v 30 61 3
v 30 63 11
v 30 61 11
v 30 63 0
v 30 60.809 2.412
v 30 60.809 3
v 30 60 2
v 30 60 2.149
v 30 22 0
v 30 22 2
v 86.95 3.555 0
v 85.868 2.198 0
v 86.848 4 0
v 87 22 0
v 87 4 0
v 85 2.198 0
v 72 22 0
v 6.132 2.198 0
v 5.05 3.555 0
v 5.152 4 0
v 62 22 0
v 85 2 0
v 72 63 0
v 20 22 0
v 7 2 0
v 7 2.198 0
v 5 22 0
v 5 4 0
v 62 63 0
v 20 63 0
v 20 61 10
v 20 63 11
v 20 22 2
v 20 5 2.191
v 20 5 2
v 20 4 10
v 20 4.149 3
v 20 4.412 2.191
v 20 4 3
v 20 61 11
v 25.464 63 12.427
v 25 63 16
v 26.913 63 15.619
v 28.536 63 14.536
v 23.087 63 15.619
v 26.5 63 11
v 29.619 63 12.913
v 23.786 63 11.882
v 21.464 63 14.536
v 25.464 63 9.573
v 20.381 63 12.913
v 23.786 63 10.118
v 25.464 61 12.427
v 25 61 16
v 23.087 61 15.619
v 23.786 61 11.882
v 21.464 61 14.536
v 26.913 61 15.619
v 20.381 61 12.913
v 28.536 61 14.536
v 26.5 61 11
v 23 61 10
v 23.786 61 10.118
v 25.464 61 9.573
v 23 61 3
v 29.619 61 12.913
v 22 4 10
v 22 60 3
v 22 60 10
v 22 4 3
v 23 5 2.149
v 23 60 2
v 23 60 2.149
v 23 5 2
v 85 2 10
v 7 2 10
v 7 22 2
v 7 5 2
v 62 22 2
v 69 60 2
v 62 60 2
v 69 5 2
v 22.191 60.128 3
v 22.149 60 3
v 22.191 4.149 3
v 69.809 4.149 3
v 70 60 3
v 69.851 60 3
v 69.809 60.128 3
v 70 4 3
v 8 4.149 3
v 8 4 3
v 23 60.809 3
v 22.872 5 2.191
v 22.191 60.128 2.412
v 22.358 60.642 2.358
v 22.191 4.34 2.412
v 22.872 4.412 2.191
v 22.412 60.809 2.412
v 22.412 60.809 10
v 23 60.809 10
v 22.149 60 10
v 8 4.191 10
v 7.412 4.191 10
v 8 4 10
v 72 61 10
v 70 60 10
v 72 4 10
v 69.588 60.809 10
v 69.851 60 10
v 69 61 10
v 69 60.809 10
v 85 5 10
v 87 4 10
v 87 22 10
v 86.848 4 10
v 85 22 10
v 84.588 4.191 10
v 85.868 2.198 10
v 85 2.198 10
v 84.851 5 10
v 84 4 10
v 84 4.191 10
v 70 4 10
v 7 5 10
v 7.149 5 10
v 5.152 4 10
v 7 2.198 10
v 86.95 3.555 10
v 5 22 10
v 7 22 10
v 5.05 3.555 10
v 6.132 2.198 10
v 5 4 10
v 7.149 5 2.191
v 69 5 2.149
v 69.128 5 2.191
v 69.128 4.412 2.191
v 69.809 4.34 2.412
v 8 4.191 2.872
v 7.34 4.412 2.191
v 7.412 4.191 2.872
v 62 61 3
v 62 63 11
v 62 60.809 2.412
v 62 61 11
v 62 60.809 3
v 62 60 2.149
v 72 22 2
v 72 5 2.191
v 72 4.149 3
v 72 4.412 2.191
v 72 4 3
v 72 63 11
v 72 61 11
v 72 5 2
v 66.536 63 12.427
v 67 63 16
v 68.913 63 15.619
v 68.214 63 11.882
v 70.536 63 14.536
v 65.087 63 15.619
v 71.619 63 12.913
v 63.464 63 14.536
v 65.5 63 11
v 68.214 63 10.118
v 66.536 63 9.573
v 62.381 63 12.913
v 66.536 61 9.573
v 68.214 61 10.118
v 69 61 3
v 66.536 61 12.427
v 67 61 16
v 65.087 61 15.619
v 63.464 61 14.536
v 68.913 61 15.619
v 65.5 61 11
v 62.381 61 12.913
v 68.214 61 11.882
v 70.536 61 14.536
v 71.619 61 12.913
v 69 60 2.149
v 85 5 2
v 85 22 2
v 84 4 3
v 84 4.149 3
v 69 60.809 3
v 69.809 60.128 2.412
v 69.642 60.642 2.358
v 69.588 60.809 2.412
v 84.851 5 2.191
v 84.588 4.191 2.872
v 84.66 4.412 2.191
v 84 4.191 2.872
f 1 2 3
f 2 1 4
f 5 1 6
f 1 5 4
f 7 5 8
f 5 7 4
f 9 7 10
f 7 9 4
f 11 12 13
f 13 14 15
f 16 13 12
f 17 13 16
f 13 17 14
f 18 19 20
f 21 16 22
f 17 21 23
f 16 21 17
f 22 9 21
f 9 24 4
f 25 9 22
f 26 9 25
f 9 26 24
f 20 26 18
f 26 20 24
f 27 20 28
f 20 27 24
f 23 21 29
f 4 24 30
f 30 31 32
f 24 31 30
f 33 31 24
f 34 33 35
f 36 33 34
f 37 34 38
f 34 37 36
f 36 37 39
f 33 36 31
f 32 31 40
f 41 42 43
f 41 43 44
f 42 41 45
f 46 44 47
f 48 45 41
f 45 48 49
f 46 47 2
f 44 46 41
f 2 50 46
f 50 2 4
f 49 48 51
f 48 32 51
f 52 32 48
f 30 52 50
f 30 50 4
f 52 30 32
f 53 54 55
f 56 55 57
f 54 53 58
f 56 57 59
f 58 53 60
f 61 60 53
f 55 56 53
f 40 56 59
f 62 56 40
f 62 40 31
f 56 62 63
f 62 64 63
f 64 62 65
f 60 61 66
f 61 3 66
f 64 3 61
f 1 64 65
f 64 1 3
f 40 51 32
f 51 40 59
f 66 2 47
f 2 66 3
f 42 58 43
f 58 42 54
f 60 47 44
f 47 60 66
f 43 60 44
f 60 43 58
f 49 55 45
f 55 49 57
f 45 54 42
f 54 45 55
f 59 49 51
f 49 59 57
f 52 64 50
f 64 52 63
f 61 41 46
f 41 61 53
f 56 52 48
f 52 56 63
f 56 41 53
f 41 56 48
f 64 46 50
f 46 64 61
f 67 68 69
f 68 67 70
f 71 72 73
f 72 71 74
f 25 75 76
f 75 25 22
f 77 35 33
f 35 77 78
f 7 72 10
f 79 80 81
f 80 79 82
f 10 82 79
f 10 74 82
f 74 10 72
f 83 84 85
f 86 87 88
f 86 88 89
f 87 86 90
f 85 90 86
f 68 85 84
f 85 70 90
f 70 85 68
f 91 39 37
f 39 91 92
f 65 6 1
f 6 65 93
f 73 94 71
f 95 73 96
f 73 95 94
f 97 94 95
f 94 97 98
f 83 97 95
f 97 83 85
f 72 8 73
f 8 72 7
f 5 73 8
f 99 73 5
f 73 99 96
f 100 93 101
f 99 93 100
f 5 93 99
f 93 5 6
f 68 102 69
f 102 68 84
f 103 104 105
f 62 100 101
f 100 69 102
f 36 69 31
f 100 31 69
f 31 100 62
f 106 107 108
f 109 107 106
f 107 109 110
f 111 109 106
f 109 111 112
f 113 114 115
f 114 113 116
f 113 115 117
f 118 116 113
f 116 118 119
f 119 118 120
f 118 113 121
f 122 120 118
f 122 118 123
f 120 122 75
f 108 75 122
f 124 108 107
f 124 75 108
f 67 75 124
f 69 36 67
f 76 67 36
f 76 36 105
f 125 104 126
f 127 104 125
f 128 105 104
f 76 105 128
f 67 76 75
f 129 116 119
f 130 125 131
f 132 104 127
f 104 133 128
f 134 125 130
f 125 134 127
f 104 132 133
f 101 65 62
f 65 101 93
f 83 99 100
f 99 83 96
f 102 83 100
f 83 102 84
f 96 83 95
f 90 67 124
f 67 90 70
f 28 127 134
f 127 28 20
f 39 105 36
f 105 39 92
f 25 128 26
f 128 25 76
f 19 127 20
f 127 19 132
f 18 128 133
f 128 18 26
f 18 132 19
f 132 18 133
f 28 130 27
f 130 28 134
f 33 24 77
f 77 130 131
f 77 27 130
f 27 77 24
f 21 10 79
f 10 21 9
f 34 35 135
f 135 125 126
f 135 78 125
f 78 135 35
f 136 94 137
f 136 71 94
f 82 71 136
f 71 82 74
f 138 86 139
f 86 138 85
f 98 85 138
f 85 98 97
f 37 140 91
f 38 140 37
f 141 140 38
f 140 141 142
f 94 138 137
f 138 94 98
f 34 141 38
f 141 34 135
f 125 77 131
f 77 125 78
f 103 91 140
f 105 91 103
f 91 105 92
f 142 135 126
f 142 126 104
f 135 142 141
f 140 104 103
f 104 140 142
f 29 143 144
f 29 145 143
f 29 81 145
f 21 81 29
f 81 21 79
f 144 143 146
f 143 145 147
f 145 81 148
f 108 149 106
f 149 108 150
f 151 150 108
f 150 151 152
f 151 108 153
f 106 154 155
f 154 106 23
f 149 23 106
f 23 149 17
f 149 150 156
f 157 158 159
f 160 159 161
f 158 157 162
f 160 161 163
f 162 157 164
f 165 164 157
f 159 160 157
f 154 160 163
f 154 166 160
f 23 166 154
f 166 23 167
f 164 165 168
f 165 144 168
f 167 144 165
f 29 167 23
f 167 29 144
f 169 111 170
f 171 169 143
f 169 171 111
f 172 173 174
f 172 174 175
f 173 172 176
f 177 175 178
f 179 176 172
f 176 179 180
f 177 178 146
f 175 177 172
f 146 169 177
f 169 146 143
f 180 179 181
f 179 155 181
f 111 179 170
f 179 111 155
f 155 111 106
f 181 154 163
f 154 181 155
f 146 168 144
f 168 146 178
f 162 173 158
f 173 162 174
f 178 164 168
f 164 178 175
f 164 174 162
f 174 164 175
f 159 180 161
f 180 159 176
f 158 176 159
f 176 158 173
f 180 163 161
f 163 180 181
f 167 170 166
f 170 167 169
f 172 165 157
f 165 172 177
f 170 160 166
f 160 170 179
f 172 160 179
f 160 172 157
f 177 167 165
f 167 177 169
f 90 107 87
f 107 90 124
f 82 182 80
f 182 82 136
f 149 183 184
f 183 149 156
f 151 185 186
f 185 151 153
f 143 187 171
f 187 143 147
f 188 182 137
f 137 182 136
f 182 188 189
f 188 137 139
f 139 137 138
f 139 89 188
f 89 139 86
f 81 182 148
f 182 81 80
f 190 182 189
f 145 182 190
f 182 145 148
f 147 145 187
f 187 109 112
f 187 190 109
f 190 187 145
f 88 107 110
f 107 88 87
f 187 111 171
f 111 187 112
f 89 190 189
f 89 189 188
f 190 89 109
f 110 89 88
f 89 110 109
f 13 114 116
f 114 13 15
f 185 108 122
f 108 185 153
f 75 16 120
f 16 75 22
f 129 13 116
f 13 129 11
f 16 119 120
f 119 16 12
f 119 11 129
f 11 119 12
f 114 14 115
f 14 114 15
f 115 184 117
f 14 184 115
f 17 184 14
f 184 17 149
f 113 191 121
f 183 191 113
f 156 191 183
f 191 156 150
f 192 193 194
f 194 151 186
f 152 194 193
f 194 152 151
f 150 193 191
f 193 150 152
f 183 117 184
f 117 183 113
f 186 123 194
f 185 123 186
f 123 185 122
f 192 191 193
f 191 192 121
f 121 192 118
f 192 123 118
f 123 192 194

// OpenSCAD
module corner_fill(len, thick)
{
    translate([0,-(thick / 2),-(thick / 2)]) difference()
    {
        cube([len,thick / 2, thick / 2]);
        rotate([0,90,0]) translate([0,0,-1]) cylinder(h=len + 2, d=thick);
    }
}

module corner_cut(len, thick)
{
    union()
    {
        corner_fill(len, thick);
        translate([0, -(thick / 2), 0])
            cube([len, (thick / 2) + 1, 1]);
        translate([0, 0, -(thick / 2)])
            cube([len, 1, (thick / 2) + 1]);
    }
}

module leg(len, side, thick, hole)
{
    difference()
    {
        union()
        {
            // Angled side
            translate([0,0,0]) cube([side, len, thick]);
            translate([0,0,0]) cube([thick, len, side]);
            // Toe piece
            translate([0,len - thick, 0])
                difference()
            {
                union()
                {
                    cube([side, thick, side + (thick / 2)]);
                    translate([side / 2, thick, side + (thick / 2)])
                        rotate([90,0,0])
                        cylinder(h=thick, d=side);
                }
                translate([side / 2, thick + 1, side + 1])
                    rotate([90,0,0])
                    cylinder(h=thick + 2, d=hole);
            }
            // Inside corner fills
            translate([thick, 0, thick]) rotate([-90,0,90])
                corner_fill(len, thick);
            translate([0,len - thick, thick]) rotate([-90,0,0])
                corner_fill(side, thick);
            translate([thick, len - thick, side])
                rotate([0,90,90])
                corner_fill(side, thick);
        }
    }
}

module leg_with_front(width, thick, leg_len, side, leg_hole)
{
    face_h = 20;
    ridge_h = 20;
    
    // Leg
    translate([20,thick,0])
        leg(leg_len - thick, side, thick, leg_hole);
        
    // face and top plate
    difference()
    {
        translate([2.5 * thick,thick,0])
            cube([width, face_h, thick]);
        translate([2.5 * thick,thick,-1]) rotate([0,-90,90])
                corner_cut(thick + 2, 2 * thick);
    }

    translate([3.5 * thick, 2 * thick, thick])
        rotate ([180,0,0])
        corner_fill(width - (3.5 * thick), thick);

    // support ridge
    difference()
    {
        translate([2.5 * thick, thick, 0])
            cube([width - (2.5 * thick), thick, side]);
        translate([2.5 * thick, thick, -1]) rotate([0,-90,90])
            corner_cut(side + 2, 2 * thick);
    }
    translate([2.5 * thick, 2*thick, 0])
        cube([thick, ridge_h - thick, side]);

    translate([3.5 * thick, 2 * thick, thick])
        rotate([0,-90,90])
        corner_fill(side - thick, thick);
}



union()
{    
    // left side
    translate([0,0,0]) leg_with_front(46, 2, 63, 10, 3);
    
    // right side
    translate([92,0,0]) mirror () leg_with_front(46, 2, 63, 10, 3);
}
